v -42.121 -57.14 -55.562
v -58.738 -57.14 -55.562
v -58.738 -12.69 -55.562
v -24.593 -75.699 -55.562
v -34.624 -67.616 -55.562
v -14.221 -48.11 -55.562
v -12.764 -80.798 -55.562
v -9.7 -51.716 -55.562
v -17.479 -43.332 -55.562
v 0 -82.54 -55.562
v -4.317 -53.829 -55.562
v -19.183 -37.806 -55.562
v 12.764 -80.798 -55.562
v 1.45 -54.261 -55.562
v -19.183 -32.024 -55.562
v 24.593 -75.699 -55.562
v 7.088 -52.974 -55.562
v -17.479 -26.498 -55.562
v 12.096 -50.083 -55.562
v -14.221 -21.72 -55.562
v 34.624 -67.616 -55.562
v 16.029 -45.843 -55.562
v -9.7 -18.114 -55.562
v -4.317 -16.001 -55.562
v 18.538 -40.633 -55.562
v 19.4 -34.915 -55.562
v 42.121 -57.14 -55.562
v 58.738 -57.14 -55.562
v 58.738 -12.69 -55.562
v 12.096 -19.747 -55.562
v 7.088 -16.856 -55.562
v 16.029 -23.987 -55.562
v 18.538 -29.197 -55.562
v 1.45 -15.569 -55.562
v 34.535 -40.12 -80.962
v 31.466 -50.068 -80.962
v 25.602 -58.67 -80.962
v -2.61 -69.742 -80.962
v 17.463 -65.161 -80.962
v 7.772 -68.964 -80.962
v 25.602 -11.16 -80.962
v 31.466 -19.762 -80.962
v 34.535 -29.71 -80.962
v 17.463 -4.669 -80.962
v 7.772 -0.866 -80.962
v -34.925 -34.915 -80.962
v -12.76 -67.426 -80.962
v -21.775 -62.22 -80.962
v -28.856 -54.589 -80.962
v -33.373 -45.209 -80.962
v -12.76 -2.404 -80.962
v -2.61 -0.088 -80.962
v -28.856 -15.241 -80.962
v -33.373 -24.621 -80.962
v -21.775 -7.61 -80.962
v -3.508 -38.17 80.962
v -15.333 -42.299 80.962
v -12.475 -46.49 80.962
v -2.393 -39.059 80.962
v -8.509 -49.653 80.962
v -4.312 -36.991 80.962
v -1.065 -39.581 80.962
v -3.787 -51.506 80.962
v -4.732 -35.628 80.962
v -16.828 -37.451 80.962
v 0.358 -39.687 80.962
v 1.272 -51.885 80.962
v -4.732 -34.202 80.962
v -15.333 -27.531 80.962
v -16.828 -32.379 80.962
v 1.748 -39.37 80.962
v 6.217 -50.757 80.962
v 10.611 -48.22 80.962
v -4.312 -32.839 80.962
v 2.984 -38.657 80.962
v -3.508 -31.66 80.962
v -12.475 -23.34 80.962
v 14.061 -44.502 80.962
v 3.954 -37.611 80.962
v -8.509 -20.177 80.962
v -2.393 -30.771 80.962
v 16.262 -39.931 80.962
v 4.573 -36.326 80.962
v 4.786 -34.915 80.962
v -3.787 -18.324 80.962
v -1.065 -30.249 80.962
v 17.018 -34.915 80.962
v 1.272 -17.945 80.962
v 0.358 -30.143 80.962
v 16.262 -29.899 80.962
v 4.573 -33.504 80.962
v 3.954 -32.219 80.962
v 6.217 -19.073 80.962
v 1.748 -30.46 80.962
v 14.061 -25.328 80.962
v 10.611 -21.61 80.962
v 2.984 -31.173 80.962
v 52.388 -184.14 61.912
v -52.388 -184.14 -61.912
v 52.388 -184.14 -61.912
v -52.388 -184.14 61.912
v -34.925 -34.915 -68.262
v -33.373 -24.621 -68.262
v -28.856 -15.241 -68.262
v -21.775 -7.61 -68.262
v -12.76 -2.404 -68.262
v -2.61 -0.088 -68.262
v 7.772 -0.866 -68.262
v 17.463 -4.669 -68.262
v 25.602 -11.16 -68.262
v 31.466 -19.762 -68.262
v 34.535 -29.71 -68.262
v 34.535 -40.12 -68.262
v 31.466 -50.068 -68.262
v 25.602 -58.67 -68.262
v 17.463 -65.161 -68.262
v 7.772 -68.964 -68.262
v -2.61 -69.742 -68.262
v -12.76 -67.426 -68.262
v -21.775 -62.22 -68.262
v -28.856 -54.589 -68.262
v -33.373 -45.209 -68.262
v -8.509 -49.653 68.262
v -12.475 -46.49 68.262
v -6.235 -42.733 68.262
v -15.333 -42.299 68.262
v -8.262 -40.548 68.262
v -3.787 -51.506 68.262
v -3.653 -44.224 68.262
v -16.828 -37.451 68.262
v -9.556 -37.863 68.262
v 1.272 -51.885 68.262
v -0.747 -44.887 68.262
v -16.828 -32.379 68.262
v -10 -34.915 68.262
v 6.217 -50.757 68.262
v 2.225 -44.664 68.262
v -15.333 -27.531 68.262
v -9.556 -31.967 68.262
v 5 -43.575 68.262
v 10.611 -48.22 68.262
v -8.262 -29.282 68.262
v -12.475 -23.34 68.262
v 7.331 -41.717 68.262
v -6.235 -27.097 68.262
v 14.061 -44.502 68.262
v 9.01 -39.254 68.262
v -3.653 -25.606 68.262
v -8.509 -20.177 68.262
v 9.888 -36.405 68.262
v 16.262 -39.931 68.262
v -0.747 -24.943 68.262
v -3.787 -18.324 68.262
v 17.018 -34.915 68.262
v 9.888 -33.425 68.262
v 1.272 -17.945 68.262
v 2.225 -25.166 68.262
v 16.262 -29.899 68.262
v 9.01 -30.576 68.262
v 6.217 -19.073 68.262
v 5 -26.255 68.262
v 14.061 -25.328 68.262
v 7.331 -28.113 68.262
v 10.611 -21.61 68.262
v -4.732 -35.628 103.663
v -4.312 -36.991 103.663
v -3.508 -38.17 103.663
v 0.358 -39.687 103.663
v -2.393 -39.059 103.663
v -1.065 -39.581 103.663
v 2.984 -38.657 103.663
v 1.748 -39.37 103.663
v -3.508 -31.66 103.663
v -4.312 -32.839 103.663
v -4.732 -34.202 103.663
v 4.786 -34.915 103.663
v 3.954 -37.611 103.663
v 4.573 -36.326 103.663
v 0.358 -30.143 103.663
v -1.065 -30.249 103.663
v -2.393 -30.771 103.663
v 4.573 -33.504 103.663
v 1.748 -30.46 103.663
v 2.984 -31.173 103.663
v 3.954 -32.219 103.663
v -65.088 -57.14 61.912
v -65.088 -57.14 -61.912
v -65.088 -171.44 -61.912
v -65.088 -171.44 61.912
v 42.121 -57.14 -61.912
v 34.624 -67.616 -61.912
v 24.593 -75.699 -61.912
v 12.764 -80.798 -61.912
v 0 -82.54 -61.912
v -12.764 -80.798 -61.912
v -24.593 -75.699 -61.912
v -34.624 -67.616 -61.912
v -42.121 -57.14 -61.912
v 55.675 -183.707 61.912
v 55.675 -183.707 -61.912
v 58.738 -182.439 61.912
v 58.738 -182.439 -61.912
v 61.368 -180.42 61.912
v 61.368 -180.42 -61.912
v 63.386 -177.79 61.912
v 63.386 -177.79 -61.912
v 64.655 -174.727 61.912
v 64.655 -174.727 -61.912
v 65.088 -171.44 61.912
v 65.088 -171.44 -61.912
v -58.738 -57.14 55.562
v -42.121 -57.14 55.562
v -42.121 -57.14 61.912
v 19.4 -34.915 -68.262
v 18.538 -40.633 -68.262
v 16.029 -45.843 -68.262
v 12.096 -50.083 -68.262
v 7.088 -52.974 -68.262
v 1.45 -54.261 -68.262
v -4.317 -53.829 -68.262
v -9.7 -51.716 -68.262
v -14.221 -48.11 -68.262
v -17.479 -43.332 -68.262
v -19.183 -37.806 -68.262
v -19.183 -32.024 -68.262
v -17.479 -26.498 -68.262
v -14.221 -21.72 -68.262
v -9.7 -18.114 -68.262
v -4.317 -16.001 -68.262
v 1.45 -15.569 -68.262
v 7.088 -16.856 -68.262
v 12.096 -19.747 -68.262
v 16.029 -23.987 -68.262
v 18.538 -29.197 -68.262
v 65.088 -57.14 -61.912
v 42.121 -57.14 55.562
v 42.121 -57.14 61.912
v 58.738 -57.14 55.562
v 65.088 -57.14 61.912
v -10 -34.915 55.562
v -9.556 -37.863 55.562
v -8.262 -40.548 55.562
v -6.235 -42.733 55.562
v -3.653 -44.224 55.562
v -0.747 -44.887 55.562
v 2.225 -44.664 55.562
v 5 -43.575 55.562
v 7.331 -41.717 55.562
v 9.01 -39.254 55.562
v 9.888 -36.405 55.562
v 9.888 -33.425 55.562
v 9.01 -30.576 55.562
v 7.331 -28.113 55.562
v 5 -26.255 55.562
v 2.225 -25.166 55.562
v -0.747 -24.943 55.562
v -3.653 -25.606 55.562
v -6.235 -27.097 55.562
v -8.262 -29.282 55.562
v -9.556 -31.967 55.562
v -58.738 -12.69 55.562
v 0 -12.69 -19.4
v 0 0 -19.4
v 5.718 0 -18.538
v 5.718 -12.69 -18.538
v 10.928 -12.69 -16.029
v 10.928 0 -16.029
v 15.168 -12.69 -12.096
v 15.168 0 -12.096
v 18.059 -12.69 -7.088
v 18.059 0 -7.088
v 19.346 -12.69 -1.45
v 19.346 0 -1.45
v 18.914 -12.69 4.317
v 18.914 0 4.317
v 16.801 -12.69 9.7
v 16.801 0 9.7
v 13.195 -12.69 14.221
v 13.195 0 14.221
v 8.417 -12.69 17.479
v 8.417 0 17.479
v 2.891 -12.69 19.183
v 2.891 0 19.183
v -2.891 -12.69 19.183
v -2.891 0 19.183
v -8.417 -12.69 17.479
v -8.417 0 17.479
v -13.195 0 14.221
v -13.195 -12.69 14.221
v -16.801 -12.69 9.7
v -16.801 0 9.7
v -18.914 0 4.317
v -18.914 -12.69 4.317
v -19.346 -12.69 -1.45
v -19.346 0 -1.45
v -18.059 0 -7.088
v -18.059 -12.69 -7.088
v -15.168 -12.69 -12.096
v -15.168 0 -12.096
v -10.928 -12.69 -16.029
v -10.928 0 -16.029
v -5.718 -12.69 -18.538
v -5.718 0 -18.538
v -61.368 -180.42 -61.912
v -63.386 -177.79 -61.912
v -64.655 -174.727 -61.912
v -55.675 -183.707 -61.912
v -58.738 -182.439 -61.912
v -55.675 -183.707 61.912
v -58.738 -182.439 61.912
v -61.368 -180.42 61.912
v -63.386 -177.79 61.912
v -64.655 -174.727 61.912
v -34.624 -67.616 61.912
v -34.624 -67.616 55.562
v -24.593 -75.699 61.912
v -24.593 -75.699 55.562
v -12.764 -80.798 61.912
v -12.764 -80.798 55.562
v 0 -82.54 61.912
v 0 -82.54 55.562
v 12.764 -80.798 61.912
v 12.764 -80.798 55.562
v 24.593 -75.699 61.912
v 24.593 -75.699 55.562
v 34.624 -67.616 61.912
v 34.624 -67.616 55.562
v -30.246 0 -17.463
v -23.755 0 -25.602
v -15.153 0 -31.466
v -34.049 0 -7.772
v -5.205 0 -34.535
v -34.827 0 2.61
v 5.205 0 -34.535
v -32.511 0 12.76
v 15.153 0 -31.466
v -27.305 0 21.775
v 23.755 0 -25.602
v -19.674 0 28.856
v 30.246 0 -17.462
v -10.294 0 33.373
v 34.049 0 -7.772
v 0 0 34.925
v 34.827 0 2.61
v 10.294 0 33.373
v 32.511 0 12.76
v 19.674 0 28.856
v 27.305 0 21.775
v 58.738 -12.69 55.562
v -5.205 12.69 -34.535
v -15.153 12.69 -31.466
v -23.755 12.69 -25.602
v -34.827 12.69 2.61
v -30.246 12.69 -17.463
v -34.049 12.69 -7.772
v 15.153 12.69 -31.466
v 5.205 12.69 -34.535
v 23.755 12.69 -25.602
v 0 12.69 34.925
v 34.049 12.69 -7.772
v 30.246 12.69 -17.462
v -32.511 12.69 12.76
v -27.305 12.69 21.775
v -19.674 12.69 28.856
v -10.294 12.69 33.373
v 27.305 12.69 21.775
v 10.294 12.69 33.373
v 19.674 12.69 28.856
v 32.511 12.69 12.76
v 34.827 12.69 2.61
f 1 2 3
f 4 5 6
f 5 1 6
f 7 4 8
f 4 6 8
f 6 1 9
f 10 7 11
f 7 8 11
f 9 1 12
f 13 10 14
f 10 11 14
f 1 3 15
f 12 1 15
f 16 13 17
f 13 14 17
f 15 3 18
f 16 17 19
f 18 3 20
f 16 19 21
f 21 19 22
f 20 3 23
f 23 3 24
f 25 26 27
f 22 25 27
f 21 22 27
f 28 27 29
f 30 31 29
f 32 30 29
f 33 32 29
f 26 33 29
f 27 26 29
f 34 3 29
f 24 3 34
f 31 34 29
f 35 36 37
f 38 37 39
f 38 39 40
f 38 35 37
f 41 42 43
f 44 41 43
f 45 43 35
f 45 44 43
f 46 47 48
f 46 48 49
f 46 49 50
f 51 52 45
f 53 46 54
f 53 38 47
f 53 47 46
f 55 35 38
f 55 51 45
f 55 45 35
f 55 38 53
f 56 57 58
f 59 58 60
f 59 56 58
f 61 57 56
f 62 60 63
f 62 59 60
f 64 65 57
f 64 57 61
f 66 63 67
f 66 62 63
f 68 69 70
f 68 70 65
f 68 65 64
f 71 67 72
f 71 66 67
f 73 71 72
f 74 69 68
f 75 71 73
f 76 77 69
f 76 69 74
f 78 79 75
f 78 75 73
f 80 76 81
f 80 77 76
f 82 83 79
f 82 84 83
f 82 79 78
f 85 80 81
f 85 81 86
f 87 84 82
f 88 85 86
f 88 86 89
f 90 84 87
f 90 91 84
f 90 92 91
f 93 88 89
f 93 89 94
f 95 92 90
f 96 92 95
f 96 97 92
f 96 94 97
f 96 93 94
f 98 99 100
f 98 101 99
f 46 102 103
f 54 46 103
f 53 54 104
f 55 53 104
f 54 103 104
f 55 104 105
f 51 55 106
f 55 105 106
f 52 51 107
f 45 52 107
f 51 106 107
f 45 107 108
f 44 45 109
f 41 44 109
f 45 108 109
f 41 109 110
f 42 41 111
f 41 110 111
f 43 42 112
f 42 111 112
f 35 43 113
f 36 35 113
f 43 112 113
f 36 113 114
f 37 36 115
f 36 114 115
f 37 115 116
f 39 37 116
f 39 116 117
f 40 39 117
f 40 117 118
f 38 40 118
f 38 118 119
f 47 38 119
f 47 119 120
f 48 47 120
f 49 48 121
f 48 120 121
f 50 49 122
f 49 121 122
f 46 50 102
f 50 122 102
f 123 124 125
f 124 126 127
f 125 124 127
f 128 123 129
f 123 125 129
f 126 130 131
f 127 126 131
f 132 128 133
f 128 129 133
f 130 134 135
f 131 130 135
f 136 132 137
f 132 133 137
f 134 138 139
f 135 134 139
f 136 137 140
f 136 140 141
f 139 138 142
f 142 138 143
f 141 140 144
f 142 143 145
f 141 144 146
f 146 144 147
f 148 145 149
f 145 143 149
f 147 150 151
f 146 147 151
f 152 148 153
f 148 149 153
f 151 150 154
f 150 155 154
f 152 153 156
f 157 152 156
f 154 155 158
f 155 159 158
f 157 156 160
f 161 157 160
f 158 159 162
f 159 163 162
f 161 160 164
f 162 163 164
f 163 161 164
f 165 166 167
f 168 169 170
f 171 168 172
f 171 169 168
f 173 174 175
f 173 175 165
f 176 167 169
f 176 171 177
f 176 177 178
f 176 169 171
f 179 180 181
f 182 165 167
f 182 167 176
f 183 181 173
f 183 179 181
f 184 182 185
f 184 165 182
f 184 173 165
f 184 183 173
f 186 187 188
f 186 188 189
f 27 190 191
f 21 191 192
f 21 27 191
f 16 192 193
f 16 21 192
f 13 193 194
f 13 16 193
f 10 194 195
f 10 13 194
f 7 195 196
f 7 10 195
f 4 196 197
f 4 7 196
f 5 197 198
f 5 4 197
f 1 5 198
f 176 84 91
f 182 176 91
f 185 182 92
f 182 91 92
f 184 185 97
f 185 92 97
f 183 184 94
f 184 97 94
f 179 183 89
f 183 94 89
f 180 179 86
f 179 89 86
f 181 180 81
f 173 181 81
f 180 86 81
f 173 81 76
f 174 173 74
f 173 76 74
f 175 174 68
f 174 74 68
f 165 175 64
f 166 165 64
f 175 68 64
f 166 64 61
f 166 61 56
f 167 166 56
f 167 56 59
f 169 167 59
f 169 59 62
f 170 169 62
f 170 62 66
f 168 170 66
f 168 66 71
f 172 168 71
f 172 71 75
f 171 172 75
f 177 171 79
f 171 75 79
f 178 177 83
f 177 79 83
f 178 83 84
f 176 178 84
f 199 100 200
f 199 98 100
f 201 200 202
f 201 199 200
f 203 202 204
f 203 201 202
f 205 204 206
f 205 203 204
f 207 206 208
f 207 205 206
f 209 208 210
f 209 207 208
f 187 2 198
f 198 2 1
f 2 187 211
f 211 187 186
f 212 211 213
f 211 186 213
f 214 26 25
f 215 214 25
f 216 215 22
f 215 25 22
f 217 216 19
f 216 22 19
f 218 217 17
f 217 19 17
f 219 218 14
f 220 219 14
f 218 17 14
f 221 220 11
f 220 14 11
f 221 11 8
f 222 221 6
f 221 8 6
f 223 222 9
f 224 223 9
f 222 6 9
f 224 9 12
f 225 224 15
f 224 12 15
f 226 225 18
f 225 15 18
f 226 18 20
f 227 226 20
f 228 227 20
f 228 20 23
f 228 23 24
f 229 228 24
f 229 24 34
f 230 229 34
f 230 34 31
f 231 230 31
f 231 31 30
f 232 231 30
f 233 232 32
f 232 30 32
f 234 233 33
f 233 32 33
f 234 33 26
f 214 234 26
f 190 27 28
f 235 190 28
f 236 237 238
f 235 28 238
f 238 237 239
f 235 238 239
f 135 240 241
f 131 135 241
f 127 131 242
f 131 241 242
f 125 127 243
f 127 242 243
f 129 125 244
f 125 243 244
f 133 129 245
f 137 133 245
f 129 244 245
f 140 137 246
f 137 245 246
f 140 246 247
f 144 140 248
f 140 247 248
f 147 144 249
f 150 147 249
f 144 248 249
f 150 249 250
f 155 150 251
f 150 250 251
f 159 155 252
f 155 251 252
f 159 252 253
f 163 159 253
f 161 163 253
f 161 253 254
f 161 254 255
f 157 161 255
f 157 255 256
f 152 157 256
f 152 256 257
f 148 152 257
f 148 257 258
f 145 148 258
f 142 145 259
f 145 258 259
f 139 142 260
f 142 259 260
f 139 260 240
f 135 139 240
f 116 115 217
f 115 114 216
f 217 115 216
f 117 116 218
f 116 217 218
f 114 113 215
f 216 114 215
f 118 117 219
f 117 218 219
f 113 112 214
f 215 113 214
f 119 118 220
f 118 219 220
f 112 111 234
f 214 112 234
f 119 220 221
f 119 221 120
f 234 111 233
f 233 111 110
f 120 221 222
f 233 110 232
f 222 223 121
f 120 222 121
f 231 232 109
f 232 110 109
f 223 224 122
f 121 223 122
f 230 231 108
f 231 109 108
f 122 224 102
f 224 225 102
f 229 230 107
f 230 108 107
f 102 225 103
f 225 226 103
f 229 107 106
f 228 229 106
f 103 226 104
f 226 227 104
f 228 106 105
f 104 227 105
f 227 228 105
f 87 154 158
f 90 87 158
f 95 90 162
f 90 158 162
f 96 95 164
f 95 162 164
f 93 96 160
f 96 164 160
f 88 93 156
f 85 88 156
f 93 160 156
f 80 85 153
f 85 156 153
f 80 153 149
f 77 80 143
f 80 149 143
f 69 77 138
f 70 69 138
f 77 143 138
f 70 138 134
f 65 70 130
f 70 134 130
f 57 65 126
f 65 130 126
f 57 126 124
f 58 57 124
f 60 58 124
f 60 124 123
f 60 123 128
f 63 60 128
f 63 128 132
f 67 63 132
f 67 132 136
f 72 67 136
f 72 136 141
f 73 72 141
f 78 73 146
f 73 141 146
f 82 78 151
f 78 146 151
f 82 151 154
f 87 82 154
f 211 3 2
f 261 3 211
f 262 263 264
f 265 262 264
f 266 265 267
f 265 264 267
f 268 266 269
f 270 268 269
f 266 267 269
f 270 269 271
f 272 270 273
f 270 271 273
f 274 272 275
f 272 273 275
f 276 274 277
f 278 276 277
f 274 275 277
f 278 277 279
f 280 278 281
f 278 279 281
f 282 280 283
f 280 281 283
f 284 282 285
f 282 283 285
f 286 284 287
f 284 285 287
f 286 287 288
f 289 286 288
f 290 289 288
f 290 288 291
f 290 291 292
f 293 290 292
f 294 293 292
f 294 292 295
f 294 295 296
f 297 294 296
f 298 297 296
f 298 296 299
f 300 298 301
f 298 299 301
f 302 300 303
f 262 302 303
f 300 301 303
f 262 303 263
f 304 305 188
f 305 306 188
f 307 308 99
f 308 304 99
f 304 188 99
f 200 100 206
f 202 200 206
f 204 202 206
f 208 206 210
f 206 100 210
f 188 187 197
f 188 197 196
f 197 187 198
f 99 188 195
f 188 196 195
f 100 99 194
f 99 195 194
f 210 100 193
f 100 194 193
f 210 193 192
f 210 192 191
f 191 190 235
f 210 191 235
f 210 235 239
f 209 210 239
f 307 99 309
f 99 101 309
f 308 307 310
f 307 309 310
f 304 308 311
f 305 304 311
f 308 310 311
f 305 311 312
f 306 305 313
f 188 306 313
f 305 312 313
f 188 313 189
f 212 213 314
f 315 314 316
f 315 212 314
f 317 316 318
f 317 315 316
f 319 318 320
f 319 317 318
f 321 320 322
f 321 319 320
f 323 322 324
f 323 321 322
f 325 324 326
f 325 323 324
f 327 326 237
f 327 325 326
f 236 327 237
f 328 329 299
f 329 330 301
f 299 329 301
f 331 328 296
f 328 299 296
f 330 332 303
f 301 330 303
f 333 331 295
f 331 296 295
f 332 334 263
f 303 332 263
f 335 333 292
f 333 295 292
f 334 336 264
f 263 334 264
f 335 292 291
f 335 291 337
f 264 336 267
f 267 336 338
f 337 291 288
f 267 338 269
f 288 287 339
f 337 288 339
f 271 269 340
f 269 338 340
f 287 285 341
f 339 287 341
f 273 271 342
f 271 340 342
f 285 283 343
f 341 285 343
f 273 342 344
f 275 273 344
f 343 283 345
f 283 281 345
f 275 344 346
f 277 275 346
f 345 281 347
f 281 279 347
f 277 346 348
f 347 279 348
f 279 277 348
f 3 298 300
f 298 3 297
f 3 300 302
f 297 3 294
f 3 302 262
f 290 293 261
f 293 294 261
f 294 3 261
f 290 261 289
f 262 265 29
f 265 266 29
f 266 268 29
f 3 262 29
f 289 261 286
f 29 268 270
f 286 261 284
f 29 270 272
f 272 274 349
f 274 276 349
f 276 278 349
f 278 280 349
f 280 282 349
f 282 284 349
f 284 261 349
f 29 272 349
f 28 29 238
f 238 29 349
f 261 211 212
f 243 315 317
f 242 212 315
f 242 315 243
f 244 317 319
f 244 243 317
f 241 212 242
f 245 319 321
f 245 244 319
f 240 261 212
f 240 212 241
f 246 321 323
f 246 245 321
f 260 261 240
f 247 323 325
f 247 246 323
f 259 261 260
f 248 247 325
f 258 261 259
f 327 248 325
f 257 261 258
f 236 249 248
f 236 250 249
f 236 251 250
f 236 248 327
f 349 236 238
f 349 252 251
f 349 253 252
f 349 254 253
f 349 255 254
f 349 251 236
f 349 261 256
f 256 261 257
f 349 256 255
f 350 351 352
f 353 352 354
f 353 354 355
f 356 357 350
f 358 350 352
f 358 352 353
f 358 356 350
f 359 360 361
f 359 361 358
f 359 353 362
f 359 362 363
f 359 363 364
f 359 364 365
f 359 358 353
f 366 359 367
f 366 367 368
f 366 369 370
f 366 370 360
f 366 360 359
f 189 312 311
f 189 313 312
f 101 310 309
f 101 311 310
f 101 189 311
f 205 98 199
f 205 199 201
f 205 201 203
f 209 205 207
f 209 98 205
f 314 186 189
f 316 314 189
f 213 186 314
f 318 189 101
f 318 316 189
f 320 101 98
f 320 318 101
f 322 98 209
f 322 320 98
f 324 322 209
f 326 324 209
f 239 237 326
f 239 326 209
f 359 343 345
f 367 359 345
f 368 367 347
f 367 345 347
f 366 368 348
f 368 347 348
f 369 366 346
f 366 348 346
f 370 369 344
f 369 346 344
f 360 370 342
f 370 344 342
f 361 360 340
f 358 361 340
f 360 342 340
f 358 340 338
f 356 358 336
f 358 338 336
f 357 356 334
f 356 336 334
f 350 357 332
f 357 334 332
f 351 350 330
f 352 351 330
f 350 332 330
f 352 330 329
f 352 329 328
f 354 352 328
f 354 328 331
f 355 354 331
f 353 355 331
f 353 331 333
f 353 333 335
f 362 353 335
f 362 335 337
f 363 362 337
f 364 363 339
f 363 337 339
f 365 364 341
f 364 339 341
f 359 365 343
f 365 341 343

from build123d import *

# Parameters (mm, degrees)
SKETCH1_R           = 34.925
BOSS_EXTRUDE1_DEPTH = 12.69
SKETCH2_R           = 19.4
BOSS_EXTRUDE2_DEPTH = 12.69
SKETCH7_W           = 117.475
SKETCH7_H           = 111.125
BOSS_EXTRUDE3_DEPTH = 44.45
SKETCH8_W           = 130.175
SKETCH8_H           = 123.825
BOSS_EXTRUDE4_DEPTH = 127
FILLET1_R           = 12.7
FILLET2_R           = 12.7
SKETCH9_R           = 47.625
CUT_EXTRUDE1_DEPTH  = 228.91291732
SKETCH10_R          = 19.4
BOSS_EXTRUDE5_DEPTH = 12.7
SKETCH11_R          = 34.925
BOSS_EXTRUDE6_DEPTH = 12.7
SKETCH17_R          = 47.625
CUT_EXTRUDE3_DEPTH  = 239.291833434
SKETCH13_R          = 10
BOSS_EXTRUDE7_DEPTH = 12.7
SKETCH14_R          = 17.018
BOSS_EXTRUDE8_DEPTH = 12.7
SKETCH15_R          = 4.785590778
BOSS_EXTRUDE9_DEPTH = 22.7


with BuildPart() as part:
    # Sketch1 → Boss-Extrude1 (new body)
    with BuildSketch(Plane(origin=(0, 0, 0), x_dir=(1, 0, 0), z_dir=(0, 1, 0))):
        with Locations(Location((0, 0, 0), (0, 0, 270))):
            Circle(SKETCH1_R)
    extrude(amount=BOSS_EXTRUDE1_DEPTH)

    # Sketch2 → Boss-Extrude2 (add)
    with BuildSketch(Plane(origin=(0, 0, 0), x_dir=(-1, 0, 0), z_dir=(0, -1, 0))):
        with Locations(Location((0, 0, 0), (0, 0, 90))):
            Circle(SKETCH2_R)
    extrude(amount=BOSS_EXTRUDE2_DEPTH)

    # Sketch7 → Boss-Extrude3 (add)
    with BuildSketch(Plane.XZ.offset(12.69)):
        Rectangle(SKETCH7_W, SKETCH7_H)
    extrude(amount=BOSS_EXTRUDE3_DEPTH)

    # Sketch8 → Boss-Extrude4 (add)
    with BuildSketch(Plane.XZ.offset(57.14)):
        Rectangle(SKETCH8_W, SKETCH8_H)
    extrude(amount=BOSS_EXTRUDE4_DEPTH)

    # Fillet1
    fillet1_edges = [part.edges().sort_by_distance(p)[0] for p in [
        (65.0875, -184.14, 0),
    ]]
    fillet(fillet1_edges, radius=FILLET1_R)

    # Fillet2
    fillet2_edges = [part.edges().sort_by_distance(p)[0] for p in [
        (-65.0875, -184.14, 0),
    ]]
    fillet(fillet2_edges, radius=FILLET2_R)

    # Sketch9 → Cut-Extrude1 (cut, through all)
    with BuildSketch(Plane(origin=(0, 0, -55.5625), x_dir=(-1, 0, 0), z_dir=(0, 0, -1))):
        with Locations((0, -34.915)):
            Circle(SKETCH9_R)
    extrude(amount=CUT_EXTRUDE1_DEPTH, mode=Mode.SUBTRACT)

    # Sketch10 → Boss-Extrude5 (add)
    with BuildSketch(Plane(origin=(0, 0, -55.5625), x_dir=(-1, 0, 0), z_dir=(0, 0, -1))):
        with Locations(Location((0, -34.915, 0), (0, 0, 180))):
            Circle(SKETCH10_R)
    extrude(amount=BOSS_EXTRUDE5_DEPTH)

    # Sketch11 → Boss-Extrude6 (add)
    with BuildSketch(Plane(origin=(0, 0, -68.2625), x_dir=(-1, 0, 0), z_dir=(0, 0, -1))):
        with Locations((0, -34.915)):
            Circle(SKETCH11_R)
    extrude(amount=BOSS_EXTRUDE6_DEPTH)

    # Sketch17 → Cut-Extrude3 (cut, through all)
    with BuildSketch(Plane.XY.offset(55.5625)):
        with Locations((0, -34.915)):
            Circle(SKETCH17_R)
    extrude(amount=CUT_EXTRUDE3_DEPTH, mode=Mode.SUBTRACT)

    # Sketch13 → Boss-Extrude7 (add)
    with BuildSketch(Plane.XY.offset(55.5625)):
        with Locations(Location((0, -34.915, 0), (0, 0, 180))):
            Circle(SKETCH13_R)
    extrude(amount=BOSS_EXTRUDE7_DEPTH)

    # Sketch14 → Boss-Extrude8 (add)
    with BuildSketch(Plane.XY.offset(68.2625)):
        with Locations((0, -34.915)):
            Circle(SKETCH14_R)
    extrude(amount=BOSS_EXTRUDE8_DEPTH)

    # Sketch15 → Boss-Extrude9 (add)
    with BuildSketch(Plane.XY.offset(80.9625)):
        with Locations((0, -34.915)):
            Circle(SKETCH15_R)
    extrude(amount=BOSS_EXTRUDE9_DEPTH)


solid = part.part
